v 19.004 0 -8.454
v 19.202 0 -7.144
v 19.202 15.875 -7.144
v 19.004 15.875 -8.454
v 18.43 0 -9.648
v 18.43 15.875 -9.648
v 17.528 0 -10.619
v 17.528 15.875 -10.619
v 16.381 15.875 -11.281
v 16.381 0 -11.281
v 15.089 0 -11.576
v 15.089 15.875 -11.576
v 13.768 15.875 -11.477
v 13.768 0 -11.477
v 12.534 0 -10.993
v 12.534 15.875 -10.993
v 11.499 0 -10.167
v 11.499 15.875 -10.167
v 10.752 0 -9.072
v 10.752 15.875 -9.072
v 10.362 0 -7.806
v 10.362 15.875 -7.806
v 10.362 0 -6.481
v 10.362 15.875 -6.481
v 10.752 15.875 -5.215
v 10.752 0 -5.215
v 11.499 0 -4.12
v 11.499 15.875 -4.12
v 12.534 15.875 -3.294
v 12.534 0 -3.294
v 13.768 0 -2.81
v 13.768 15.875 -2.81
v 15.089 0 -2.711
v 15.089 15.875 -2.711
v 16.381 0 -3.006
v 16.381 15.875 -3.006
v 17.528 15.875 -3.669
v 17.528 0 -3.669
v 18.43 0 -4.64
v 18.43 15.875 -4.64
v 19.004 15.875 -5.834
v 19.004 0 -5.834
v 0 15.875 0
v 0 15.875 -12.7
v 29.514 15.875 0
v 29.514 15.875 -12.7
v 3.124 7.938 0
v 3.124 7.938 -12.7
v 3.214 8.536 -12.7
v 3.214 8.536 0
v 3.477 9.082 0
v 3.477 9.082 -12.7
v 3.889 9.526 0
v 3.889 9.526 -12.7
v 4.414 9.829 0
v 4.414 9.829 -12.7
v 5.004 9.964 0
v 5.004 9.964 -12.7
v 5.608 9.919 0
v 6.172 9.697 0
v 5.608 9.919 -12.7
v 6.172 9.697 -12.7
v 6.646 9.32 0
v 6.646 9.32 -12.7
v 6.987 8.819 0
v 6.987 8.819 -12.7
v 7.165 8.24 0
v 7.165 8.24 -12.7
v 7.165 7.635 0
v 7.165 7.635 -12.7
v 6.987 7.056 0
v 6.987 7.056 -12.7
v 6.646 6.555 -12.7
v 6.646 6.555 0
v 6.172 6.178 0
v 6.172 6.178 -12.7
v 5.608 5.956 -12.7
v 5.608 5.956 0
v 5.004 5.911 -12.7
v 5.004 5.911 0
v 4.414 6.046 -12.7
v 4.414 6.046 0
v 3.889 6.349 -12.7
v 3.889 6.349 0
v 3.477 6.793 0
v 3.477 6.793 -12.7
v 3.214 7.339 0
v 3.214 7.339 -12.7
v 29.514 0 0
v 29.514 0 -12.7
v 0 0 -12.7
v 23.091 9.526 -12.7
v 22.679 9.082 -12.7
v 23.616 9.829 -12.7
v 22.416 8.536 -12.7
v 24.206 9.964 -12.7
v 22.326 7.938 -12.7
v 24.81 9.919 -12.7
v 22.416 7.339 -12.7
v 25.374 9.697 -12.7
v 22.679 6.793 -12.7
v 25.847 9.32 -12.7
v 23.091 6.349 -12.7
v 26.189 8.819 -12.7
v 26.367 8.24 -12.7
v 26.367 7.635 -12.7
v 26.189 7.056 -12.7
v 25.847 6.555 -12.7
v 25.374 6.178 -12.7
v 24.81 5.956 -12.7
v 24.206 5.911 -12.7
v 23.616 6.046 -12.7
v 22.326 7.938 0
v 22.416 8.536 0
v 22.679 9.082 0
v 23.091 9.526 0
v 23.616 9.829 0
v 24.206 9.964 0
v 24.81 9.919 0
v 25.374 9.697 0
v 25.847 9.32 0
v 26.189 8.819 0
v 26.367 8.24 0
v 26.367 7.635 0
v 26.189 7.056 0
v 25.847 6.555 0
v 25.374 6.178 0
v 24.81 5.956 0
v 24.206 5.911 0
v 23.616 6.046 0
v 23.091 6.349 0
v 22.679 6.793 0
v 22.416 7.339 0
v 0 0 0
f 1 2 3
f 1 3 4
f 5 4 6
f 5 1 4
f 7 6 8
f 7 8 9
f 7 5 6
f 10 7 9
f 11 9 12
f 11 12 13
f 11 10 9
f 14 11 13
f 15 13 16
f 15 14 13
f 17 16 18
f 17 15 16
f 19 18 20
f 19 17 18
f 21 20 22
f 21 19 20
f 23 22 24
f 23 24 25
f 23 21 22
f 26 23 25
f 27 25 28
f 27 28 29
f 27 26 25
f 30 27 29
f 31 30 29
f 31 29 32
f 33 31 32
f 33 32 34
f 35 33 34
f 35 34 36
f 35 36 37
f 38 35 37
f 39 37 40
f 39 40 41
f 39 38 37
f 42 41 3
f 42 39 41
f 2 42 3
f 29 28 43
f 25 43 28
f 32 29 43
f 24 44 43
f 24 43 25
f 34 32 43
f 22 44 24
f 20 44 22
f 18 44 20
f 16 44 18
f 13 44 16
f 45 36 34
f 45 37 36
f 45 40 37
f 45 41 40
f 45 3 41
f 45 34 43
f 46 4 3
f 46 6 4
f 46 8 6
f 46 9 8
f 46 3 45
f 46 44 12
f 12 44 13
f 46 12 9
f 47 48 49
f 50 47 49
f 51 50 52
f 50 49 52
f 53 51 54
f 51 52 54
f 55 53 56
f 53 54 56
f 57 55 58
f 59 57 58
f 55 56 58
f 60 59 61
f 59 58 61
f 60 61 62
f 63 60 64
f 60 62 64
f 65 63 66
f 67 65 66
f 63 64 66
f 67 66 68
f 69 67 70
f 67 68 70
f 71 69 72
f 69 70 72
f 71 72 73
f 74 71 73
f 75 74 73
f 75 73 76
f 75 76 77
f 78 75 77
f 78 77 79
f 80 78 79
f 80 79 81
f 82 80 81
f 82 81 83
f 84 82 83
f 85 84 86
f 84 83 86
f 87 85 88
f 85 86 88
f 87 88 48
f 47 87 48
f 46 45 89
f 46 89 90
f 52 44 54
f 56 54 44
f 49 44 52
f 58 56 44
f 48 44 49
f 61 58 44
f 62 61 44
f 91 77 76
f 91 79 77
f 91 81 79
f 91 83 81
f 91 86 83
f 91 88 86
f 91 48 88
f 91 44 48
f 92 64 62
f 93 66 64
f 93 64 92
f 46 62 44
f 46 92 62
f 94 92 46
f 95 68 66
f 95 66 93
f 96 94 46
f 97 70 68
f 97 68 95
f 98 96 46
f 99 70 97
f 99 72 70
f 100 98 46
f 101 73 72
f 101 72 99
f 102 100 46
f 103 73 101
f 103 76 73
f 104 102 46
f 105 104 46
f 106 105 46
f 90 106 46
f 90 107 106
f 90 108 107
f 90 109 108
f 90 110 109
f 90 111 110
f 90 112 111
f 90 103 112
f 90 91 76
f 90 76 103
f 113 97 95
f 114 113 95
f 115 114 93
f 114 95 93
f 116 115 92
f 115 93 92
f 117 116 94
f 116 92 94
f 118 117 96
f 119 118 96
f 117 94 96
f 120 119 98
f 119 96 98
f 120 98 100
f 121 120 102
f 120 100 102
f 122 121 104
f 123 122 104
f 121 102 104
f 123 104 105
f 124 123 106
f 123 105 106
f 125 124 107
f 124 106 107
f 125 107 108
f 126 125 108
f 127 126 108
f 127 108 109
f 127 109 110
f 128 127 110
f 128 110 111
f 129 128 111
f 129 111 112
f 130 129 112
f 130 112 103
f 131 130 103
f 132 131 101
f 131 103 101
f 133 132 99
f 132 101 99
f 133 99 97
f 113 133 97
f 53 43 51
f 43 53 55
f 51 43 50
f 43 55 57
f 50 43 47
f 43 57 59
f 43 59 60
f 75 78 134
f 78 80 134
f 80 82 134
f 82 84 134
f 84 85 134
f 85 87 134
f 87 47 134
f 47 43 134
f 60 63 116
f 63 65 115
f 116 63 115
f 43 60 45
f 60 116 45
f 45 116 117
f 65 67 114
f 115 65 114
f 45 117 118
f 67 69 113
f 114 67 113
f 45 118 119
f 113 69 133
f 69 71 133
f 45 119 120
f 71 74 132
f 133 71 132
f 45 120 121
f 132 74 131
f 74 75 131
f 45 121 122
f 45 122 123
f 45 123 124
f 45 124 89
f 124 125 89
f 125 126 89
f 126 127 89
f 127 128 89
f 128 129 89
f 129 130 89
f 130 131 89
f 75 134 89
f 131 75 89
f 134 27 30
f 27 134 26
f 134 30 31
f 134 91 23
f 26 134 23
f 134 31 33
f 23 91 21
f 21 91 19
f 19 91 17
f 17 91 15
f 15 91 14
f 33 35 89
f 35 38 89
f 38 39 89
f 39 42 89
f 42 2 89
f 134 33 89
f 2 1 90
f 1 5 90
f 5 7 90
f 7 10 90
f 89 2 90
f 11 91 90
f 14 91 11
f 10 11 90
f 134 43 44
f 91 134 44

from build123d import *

# Parameters (mm, degrees)
SKETCH1_W           = 29.513896991
SKETCH1_H           = 12.7
SKETCH1_R           = 4.445
BOSS_EXTRUDE1_DEPTH = 15.875
SKETCH2_R           = 2.032
CUT_EXTRUDE1_DEPTH  = 12.7


with BuildPart() as part:
    # Sketch1 → Boss-Extrude1 (new body)
    with BuildSketch(Plane(origin=(0, 0, 0), x_dir=(1, 0, 0), z_dir=(0, 1, 0))):
        with Locations((14.756948496, 6.35)):
            Rectangle(SKETCH1_W, SKETCH1_H)
        with Locations((14.756948496, 7.14375)):
            Circle(SKETCH1_R, mode=Mode.SUBTRACT)
    extrude(amount=BOSS_EXTRUDE1_DEPTH)

    # Sketch2 → Cut-Extrude1 (cut)
    with BuildSketch(Plane(origin=(0, 0, -12.7), x_dir=(-1, 0, 0), z_dir=(0, 0, -1))):
        with Locations((-5.155974248, 7.9375)):
            Circle(SKETCH2_R)
        with Locations((-24.357922743, 7.9375)):
            Circle(SKETCH2_R)
    extrude(amount=-CUT_EXTRUDE1_DEPTH, mode=Mode.SUBTRACT)


solid = part.part
